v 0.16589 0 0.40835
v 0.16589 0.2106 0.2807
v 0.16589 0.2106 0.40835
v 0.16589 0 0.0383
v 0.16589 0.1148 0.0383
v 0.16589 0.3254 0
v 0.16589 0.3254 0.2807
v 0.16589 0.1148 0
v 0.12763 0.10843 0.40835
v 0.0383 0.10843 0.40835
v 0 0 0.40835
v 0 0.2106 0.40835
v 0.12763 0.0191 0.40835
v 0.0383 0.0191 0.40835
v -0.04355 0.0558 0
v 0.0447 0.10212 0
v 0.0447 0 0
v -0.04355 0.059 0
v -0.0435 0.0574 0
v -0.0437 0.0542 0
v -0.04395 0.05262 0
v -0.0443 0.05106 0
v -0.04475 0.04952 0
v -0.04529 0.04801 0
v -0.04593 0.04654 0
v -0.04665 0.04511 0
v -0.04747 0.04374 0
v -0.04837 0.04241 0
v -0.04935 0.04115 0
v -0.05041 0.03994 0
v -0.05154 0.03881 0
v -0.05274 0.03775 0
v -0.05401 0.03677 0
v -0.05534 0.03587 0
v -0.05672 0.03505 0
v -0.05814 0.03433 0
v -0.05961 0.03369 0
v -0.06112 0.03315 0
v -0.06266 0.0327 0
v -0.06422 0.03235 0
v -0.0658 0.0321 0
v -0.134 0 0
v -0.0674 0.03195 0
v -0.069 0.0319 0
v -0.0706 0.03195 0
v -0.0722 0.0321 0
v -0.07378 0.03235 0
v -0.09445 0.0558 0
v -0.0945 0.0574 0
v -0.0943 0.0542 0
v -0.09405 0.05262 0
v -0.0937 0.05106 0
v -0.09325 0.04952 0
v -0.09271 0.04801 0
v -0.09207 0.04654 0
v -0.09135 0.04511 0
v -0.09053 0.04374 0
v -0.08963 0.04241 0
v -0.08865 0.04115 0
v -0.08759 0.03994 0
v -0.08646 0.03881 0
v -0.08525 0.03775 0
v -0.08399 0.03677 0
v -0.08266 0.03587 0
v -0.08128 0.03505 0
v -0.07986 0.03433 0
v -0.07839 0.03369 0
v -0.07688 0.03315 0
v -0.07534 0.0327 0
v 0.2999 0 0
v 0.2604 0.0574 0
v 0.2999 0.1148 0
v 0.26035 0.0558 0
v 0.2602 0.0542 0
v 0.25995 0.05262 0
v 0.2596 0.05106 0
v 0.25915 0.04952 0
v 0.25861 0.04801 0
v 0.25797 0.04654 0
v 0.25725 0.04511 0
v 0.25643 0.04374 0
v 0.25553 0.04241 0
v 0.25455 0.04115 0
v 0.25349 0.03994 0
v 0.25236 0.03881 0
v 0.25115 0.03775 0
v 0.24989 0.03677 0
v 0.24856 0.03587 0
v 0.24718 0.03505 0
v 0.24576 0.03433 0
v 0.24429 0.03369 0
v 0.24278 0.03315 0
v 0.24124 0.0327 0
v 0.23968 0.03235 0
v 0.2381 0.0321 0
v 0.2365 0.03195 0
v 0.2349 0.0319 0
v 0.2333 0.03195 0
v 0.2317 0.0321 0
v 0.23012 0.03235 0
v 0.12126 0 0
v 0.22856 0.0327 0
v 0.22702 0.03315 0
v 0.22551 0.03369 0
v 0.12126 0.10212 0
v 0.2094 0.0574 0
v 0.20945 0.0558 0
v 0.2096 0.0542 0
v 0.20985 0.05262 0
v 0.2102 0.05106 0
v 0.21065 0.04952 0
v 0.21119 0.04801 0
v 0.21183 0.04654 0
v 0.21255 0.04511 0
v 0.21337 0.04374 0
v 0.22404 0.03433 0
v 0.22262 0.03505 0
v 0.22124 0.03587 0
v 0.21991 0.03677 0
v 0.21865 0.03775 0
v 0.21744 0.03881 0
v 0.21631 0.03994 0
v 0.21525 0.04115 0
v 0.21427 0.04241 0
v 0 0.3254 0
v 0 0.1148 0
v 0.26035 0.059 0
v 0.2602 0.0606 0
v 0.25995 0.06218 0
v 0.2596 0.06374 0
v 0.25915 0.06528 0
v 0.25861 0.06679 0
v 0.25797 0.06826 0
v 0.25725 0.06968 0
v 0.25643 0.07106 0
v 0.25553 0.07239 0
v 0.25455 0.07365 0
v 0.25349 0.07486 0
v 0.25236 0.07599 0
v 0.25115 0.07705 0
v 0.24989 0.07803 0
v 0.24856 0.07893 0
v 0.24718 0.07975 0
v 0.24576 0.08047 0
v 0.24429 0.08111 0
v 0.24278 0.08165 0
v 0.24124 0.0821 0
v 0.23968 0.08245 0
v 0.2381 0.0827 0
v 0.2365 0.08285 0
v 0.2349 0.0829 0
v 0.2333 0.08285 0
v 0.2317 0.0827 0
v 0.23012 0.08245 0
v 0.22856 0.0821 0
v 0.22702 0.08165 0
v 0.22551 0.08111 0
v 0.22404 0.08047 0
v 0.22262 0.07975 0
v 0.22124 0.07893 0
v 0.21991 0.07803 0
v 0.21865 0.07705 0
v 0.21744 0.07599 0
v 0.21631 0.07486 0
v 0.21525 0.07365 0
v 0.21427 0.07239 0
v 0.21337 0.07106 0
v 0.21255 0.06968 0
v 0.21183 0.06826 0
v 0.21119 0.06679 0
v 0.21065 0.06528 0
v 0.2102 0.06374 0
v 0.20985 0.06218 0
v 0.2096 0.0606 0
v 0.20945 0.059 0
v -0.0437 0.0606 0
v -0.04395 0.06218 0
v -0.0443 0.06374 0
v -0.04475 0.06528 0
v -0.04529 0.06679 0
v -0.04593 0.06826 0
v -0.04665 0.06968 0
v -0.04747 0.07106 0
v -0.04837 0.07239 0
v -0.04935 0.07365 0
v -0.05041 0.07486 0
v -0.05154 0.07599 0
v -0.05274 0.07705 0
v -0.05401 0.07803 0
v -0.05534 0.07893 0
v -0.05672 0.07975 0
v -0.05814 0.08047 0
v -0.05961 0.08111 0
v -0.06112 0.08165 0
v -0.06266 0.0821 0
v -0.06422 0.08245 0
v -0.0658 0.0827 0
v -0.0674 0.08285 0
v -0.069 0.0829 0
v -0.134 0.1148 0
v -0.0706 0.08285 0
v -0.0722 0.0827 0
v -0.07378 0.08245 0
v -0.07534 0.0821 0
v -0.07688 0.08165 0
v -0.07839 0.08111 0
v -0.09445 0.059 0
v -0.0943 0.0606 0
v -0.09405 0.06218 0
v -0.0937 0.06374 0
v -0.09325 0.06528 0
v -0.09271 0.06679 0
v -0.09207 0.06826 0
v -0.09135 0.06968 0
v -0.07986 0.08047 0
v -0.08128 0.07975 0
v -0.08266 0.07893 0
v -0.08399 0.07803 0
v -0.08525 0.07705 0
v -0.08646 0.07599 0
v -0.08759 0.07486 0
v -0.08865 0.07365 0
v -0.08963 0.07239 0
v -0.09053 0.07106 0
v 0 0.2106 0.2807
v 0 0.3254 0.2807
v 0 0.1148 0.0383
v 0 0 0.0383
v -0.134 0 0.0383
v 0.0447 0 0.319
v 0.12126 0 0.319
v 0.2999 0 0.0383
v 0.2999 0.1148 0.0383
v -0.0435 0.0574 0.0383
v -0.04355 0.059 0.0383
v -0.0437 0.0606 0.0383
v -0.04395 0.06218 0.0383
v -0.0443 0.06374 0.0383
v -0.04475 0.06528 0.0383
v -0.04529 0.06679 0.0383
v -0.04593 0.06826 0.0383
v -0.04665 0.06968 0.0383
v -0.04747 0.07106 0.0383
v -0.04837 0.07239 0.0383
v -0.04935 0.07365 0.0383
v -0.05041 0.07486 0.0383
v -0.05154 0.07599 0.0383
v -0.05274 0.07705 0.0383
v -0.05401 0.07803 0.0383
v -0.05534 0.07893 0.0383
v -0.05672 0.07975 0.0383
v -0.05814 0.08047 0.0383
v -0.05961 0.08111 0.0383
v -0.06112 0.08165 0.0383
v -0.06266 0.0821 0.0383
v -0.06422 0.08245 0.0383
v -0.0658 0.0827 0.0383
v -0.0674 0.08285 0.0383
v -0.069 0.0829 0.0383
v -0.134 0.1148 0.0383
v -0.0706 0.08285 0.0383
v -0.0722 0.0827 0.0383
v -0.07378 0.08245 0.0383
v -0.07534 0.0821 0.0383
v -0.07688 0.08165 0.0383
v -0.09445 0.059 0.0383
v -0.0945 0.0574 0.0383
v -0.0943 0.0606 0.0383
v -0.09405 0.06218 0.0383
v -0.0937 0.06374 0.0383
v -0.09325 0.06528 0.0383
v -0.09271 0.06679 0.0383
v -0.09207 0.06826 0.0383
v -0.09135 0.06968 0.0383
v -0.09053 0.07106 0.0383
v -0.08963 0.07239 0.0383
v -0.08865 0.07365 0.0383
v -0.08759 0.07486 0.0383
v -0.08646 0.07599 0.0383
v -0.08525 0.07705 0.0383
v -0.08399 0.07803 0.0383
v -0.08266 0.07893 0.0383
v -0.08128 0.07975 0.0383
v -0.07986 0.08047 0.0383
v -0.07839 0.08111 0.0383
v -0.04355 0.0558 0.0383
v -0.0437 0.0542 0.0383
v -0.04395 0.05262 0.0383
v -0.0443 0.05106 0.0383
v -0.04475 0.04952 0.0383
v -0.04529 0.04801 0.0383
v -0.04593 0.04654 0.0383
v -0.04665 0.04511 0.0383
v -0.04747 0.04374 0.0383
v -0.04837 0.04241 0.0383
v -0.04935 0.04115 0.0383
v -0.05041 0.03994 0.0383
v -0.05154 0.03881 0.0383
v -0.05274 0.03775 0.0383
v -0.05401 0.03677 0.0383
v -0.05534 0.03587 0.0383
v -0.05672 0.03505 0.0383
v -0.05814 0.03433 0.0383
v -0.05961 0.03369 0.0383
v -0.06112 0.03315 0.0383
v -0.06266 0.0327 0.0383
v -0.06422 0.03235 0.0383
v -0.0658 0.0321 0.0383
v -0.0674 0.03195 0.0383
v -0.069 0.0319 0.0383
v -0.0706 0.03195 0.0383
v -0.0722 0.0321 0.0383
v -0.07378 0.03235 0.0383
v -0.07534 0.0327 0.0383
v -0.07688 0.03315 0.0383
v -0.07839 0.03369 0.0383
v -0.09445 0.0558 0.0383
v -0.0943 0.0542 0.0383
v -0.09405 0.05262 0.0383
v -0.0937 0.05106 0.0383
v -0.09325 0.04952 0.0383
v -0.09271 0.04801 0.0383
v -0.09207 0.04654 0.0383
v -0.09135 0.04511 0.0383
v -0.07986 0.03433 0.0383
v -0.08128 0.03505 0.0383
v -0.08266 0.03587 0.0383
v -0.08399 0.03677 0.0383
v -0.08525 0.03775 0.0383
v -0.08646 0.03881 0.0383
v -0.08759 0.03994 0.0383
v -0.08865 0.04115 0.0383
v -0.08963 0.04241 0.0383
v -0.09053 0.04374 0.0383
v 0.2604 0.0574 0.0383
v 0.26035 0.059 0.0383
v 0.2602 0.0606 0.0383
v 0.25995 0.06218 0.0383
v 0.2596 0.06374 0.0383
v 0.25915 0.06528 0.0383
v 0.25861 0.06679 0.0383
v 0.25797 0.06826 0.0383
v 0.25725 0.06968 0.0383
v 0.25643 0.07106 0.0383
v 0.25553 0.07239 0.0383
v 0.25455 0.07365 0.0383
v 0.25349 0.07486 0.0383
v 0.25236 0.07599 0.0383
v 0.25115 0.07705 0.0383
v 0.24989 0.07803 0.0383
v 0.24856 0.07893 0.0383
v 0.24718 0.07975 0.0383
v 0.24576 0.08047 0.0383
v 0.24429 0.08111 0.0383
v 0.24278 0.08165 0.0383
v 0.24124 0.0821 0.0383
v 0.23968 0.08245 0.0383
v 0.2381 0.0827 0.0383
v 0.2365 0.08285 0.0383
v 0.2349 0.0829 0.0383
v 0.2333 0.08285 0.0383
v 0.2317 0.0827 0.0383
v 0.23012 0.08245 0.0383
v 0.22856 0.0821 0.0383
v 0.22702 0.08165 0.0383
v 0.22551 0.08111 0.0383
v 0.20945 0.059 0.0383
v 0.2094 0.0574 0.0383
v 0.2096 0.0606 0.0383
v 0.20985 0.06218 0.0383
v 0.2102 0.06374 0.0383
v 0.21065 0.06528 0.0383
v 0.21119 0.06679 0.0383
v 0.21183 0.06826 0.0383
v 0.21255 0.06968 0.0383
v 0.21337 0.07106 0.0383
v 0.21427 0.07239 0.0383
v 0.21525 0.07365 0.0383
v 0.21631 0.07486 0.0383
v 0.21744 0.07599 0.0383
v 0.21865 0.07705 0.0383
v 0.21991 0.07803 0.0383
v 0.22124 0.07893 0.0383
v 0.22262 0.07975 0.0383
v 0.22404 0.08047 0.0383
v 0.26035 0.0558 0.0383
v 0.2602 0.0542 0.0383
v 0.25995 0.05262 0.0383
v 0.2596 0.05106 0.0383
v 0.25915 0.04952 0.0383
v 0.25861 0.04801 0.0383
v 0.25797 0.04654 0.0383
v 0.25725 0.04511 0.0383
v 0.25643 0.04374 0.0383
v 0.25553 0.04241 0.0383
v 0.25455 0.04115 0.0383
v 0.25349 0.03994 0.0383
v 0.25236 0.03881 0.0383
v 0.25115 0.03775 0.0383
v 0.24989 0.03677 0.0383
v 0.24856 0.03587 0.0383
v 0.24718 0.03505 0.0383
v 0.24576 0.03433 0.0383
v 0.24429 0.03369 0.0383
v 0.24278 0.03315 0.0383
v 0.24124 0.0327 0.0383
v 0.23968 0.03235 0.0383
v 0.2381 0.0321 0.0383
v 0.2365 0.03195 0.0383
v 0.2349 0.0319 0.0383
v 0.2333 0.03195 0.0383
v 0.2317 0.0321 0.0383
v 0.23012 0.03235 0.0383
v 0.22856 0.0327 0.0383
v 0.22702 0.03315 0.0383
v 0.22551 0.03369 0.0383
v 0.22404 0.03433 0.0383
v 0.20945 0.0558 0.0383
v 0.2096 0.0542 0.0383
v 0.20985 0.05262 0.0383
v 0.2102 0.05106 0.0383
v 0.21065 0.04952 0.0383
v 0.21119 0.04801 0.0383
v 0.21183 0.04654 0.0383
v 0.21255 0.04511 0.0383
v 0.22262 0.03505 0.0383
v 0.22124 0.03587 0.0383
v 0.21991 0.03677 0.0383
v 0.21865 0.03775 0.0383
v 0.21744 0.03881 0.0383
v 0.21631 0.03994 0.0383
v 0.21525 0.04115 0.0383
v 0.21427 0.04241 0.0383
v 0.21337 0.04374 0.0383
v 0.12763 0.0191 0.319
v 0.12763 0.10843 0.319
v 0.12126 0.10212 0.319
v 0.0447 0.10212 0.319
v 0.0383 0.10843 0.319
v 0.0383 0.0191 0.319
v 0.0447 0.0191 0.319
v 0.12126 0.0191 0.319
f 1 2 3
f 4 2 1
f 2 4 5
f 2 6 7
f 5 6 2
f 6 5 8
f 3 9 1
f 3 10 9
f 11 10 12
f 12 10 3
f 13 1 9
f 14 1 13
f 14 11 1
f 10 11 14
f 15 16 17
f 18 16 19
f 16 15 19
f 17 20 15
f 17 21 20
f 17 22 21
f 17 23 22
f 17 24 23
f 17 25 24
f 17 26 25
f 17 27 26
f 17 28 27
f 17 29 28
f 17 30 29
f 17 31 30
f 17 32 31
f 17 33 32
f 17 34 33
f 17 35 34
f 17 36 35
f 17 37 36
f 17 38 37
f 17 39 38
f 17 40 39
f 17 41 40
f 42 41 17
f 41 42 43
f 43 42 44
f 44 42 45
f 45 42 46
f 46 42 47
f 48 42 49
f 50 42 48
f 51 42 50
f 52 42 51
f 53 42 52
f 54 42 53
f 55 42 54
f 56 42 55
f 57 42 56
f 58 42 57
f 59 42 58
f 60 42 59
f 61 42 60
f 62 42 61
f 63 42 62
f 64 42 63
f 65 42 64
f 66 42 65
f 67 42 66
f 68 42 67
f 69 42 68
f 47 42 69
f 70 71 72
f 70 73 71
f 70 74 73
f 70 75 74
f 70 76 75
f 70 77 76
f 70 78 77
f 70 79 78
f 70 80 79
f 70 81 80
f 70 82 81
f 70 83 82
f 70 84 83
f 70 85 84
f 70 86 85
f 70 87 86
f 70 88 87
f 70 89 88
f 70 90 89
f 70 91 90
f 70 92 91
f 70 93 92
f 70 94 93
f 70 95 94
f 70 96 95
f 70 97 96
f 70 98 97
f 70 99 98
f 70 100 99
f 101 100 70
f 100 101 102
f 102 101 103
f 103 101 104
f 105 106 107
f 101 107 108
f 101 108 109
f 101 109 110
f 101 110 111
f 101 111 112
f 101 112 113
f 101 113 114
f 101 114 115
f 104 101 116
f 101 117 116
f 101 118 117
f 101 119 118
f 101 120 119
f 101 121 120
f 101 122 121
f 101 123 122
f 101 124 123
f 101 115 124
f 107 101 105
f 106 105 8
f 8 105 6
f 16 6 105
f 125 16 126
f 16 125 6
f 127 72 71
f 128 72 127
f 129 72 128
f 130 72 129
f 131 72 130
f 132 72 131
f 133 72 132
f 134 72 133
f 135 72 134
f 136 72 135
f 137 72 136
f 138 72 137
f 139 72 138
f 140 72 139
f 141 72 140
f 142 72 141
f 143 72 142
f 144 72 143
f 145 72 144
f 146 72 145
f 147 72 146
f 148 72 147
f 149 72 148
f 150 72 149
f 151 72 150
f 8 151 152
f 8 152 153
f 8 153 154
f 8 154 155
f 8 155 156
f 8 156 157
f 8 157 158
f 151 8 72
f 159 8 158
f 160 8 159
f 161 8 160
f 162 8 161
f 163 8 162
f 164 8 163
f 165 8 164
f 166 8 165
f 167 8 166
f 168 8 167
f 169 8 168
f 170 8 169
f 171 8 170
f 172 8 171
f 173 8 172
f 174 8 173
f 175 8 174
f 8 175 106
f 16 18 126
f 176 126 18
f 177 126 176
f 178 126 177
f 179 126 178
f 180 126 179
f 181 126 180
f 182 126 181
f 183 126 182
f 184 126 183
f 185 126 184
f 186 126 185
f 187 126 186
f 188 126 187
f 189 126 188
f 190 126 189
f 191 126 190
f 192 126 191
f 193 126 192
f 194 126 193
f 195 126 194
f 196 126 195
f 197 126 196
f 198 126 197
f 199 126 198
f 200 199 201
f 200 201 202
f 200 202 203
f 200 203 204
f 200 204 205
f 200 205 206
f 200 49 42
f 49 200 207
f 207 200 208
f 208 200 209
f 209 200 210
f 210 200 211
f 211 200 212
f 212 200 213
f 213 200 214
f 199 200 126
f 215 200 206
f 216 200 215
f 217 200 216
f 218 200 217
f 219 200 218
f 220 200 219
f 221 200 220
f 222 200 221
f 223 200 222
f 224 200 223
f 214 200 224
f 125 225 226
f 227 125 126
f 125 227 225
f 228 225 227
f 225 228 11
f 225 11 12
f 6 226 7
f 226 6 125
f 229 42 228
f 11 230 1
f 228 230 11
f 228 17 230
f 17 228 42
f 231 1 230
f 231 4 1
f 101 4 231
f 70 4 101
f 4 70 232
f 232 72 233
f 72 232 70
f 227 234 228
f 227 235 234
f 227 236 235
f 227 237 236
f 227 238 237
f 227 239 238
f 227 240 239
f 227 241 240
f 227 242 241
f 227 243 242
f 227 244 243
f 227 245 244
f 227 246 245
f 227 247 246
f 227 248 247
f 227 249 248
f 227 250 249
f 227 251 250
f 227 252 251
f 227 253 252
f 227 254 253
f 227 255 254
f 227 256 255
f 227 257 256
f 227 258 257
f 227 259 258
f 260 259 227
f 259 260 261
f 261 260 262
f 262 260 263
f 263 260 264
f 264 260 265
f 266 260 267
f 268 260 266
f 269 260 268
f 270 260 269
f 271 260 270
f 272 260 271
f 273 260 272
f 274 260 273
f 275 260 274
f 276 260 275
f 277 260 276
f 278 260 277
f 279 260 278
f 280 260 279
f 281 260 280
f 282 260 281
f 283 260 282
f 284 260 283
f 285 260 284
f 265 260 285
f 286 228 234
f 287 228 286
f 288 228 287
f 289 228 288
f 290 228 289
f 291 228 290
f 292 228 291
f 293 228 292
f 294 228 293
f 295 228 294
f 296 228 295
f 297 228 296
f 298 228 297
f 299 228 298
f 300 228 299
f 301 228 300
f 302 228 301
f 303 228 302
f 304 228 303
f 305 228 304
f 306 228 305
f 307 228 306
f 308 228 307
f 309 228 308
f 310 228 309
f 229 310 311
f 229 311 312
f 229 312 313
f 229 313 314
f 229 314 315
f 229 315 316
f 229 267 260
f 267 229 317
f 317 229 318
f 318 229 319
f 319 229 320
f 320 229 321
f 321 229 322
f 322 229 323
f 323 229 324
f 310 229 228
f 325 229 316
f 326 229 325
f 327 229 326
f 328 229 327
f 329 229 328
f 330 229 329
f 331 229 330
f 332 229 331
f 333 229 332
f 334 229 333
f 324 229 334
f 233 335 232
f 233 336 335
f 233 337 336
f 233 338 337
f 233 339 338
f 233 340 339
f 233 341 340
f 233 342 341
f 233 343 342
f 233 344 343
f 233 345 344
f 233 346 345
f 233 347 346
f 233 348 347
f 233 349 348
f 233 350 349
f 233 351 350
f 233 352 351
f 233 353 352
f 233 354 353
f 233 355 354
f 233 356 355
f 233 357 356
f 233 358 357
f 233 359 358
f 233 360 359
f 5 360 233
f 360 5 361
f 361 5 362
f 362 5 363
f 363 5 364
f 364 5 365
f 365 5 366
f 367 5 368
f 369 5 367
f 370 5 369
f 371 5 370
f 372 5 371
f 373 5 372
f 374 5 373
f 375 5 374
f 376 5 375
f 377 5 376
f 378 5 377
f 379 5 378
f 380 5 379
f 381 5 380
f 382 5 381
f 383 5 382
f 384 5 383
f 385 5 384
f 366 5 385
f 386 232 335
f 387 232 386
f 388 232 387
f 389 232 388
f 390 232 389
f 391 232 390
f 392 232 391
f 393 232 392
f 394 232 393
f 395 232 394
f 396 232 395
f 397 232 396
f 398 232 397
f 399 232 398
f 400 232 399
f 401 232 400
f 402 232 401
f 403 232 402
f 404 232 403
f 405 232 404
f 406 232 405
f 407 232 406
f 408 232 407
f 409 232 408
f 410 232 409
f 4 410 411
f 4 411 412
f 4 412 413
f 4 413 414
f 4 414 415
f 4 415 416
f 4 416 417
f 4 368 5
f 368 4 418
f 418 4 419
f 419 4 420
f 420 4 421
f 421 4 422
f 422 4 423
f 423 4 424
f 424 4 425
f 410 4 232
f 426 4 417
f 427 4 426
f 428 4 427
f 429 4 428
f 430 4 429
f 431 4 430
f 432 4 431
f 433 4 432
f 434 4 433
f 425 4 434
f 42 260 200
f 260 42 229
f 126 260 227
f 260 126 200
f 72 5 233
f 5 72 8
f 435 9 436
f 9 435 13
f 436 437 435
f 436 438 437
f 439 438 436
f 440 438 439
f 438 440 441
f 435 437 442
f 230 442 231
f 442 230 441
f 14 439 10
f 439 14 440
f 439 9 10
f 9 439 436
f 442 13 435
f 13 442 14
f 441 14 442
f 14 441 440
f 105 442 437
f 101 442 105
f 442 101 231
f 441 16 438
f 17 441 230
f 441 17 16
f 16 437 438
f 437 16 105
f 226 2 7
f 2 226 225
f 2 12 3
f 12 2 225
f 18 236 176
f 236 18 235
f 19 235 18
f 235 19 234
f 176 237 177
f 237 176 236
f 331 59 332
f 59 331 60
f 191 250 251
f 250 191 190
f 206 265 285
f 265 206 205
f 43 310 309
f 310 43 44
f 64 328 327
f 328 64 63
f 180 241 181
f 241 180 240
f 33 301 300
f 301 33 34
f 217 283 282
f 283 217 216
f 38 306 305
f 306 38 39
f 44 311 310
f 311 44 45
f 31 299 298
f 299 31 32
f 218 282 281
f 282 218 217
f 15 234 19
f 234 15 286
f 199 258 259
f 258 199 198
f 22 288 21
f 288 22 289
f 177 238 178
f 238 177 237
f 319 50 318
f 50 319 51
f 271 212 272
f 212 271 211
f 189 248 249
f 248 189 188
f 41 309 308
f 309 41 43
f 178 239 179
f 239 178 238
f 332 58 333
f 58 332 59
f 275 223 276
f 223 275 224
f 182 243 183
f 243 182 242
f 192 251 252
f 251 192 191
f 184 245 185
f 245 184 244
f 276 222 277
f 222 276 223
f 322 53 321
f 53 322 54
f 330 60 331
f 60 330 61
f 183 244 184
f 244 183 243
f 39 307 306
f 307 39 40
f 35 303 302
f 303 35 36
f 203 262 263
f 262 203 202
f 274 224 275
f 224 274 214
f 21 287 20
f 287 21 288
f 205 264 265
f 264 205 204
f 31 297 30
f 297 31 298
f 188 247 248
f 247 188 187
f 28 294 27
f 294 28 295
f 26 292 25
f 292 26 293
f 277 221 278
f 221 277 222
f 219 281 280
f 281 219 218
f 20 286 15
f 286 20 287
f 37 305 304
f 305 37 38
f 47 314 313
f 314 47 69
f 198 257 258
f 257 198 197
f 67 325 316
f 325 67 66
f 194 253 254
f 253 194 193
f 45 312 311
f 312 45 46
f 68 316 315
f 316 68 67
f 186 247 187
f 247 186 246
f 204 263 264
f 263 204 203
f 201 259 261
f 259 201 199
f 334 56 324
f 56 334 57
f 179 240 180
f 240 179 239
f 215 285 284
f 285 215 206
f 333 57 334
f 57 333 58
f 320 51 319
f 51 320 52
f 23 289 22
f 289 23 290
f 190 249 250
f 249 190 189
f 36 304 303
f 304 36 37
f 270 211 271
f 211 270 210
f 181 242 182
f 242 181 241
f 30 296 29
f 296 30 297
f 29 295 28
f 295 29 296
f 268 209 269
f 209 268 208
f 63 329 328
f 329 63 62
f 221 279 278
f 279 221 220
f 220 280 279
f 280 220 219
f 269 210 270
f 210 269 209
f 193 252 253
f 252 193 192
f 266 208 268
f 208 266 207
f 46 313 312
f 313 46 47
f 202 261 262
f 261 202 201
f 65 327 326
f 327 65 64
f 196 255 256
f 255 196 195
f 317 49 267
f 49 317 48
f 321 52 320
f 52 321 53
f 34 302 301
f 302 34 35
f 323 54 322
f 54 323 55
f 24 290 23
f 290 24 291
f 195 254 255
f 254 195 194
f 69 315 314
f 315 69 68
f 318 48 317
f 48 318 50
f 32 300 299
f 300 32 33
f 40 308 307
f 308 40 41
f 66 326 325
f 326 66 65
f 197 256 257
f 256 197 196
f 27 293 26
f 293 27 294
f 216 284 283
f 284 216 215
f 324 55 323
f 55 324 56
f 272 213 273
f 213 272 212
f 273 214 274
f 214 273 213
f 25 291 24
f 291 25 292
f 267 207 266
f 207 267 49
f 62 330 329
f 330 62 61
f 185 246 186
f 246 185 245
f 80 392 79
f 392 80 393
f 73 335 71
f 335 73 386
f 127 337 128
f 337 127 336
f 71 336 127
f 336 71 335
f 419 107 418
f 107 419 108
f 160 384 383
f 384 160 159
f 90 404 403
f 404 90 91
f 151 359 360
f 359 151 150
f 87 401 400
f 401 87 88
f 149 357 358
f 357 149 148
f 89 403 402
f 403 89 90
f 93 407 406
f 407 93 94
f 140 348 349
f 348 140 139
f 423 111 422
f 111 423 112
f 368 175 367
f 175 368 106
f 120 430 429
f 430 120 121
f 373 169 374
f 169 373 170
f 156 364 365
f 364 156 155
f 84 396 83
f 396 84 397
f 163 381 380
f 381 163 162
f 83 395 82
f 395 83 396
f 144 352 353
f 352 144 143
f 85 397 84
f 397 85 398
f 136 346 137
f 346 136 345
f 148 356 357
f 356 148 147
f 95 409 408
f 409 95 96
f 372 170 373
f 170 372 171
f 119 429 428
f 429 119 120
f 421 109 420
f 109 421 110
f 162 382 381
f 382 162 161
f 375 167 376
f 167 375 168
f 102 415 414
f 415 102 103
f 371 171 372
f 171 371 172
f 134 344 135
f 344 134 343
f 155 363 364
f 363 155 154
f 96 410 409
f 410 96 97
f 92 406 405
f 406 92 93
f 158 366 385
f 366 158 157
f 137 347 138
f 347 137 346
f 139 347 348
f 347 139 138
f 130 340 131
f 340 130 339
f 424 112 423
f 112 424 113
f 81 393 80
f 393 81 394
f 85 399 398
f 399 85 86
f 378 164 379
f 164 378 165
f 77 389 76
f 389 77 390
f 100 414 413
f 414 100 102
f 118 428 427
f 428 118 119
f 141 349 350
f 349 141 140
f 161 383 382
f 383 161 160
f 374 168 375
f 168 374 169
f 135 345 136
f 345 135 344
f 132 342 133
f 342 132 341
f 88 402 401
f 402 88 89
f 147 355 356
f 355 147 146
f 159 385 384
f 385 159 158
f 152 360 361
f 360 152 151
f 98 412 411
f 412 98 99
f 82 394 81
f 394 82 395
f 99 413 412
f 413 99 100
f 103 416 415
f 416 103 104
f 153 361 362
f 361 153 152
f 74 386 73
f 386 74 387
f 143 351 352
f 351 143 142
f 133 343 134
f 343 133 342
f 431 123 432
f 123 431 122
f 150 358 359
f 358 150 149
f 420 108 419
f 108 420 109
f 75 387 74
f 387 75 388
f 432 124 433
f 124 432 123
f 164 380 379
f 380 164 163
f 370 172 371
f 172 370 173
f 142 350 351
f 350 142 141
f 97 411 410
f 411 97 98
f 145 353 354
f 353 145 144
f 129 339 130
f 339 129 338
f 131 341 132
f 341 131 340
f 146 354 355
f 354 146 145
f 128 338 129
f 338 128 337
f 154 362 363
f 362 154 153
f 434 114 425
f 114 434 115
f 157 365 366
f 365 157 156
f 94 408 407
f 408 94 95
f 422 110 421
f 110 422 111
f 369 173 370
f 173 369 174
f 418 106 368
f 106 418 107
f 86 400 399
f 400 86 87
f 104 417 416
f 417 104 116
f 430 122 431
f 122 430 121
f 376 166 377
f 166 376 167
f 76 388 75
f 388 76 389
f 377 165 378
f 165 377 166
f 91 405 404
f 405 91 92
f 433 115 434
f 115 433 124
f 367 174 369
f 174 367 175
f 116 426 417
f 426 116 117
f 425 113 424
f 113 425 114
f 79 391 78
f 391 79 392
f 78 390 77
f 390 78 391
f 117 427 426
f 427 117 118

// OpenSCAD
// Parameters

// Main base dimensions
base_length = 0.165891;
base_width = 0.325401;
base_height = 0.408347;

// Recess 1 (Top square cut)
recess1_length = 0.089326;
recess1_width = 0.089326;
recess1_x_offset = 0.0383;
recess1_y_offset = 0.0191;
recess1_z_start = 0.319;

// Recess 2 (Lower rectangular opening)
recess2_length = 0.076565;
recess2_width = 0.132416;
recess2_x_offset = 0.0447;
recess2_y_offset = -0.0303;
recess2_z_start = 0;
recess2_z_end = 0.319;

// Recess 3 (Upper back strip cut)
recess3_width = 0.114848;
recess3_y_offset = 0.2106;
recess3_z_start = 0.2807;

// Shallow solid base addition
add_length = 0.4339;
add_width = 0.1148;
add_height = 0.0383;
add_x_offset = -0.134;

// Through holes
hole_radius = 0.0255;
hole_y_offset = 0.0574;
hole1_x_offset = -0.069;
hole2_x_offset = 0.2349;

// Resolution and epsilon for clean boolean operations
$fn = 100;
eps = 0.001;

// Reusable module for the entire part
module main_model() {
    difference() {
        // Combine main base and shallow addition
        union() {
            // Main rectangular base
            cube([base_length, base_width, base_height]);
            
            // Shallow solid base addition at the front
            translate([add_x_offset, 0, 0])
                cube([add_length, add_width, add_height]);
        }
        
        // Cut 1: Top square recess
        translate([recess1_x_offset, recess1_y_offset, recess1_z_start])
            cube([recess1_length, recess1_width, base_height - recess1_z_start + eps]);
            
        // Cut 2: Lower rectangular opening breaking out the front face
        translate([recess2_x_offset, recess2_y_offset, recess2_z_start - eps])
            cube([recess2_length, recess2_width, recess2_z_end - recess2_z_start + eps]);
            
        // Cut 3: Upper back strip cut
        translate([-eps, recess3_y_offset, recess3_z_start])
            cube([base_length + 2*eps, recess3_width + eps, base_height - recess3_z_start + eps]);
            
        // Cut 4: Circular through hole 1 in the shallow addition
        translate([hole1_x_offset, hole_y_offset, -eps])
            cylinder(h=add_height + 2*eps, r=hole_radius);
            
        // Cut 5: Circular through hole 2 in the shallow addition
        translate([hole2_x_offset, hole_y_offset, -eps])
            cylinder(h=add_height + 2*eps, r=hole_radius);
    }
}

// Render the geometry
main_model();
